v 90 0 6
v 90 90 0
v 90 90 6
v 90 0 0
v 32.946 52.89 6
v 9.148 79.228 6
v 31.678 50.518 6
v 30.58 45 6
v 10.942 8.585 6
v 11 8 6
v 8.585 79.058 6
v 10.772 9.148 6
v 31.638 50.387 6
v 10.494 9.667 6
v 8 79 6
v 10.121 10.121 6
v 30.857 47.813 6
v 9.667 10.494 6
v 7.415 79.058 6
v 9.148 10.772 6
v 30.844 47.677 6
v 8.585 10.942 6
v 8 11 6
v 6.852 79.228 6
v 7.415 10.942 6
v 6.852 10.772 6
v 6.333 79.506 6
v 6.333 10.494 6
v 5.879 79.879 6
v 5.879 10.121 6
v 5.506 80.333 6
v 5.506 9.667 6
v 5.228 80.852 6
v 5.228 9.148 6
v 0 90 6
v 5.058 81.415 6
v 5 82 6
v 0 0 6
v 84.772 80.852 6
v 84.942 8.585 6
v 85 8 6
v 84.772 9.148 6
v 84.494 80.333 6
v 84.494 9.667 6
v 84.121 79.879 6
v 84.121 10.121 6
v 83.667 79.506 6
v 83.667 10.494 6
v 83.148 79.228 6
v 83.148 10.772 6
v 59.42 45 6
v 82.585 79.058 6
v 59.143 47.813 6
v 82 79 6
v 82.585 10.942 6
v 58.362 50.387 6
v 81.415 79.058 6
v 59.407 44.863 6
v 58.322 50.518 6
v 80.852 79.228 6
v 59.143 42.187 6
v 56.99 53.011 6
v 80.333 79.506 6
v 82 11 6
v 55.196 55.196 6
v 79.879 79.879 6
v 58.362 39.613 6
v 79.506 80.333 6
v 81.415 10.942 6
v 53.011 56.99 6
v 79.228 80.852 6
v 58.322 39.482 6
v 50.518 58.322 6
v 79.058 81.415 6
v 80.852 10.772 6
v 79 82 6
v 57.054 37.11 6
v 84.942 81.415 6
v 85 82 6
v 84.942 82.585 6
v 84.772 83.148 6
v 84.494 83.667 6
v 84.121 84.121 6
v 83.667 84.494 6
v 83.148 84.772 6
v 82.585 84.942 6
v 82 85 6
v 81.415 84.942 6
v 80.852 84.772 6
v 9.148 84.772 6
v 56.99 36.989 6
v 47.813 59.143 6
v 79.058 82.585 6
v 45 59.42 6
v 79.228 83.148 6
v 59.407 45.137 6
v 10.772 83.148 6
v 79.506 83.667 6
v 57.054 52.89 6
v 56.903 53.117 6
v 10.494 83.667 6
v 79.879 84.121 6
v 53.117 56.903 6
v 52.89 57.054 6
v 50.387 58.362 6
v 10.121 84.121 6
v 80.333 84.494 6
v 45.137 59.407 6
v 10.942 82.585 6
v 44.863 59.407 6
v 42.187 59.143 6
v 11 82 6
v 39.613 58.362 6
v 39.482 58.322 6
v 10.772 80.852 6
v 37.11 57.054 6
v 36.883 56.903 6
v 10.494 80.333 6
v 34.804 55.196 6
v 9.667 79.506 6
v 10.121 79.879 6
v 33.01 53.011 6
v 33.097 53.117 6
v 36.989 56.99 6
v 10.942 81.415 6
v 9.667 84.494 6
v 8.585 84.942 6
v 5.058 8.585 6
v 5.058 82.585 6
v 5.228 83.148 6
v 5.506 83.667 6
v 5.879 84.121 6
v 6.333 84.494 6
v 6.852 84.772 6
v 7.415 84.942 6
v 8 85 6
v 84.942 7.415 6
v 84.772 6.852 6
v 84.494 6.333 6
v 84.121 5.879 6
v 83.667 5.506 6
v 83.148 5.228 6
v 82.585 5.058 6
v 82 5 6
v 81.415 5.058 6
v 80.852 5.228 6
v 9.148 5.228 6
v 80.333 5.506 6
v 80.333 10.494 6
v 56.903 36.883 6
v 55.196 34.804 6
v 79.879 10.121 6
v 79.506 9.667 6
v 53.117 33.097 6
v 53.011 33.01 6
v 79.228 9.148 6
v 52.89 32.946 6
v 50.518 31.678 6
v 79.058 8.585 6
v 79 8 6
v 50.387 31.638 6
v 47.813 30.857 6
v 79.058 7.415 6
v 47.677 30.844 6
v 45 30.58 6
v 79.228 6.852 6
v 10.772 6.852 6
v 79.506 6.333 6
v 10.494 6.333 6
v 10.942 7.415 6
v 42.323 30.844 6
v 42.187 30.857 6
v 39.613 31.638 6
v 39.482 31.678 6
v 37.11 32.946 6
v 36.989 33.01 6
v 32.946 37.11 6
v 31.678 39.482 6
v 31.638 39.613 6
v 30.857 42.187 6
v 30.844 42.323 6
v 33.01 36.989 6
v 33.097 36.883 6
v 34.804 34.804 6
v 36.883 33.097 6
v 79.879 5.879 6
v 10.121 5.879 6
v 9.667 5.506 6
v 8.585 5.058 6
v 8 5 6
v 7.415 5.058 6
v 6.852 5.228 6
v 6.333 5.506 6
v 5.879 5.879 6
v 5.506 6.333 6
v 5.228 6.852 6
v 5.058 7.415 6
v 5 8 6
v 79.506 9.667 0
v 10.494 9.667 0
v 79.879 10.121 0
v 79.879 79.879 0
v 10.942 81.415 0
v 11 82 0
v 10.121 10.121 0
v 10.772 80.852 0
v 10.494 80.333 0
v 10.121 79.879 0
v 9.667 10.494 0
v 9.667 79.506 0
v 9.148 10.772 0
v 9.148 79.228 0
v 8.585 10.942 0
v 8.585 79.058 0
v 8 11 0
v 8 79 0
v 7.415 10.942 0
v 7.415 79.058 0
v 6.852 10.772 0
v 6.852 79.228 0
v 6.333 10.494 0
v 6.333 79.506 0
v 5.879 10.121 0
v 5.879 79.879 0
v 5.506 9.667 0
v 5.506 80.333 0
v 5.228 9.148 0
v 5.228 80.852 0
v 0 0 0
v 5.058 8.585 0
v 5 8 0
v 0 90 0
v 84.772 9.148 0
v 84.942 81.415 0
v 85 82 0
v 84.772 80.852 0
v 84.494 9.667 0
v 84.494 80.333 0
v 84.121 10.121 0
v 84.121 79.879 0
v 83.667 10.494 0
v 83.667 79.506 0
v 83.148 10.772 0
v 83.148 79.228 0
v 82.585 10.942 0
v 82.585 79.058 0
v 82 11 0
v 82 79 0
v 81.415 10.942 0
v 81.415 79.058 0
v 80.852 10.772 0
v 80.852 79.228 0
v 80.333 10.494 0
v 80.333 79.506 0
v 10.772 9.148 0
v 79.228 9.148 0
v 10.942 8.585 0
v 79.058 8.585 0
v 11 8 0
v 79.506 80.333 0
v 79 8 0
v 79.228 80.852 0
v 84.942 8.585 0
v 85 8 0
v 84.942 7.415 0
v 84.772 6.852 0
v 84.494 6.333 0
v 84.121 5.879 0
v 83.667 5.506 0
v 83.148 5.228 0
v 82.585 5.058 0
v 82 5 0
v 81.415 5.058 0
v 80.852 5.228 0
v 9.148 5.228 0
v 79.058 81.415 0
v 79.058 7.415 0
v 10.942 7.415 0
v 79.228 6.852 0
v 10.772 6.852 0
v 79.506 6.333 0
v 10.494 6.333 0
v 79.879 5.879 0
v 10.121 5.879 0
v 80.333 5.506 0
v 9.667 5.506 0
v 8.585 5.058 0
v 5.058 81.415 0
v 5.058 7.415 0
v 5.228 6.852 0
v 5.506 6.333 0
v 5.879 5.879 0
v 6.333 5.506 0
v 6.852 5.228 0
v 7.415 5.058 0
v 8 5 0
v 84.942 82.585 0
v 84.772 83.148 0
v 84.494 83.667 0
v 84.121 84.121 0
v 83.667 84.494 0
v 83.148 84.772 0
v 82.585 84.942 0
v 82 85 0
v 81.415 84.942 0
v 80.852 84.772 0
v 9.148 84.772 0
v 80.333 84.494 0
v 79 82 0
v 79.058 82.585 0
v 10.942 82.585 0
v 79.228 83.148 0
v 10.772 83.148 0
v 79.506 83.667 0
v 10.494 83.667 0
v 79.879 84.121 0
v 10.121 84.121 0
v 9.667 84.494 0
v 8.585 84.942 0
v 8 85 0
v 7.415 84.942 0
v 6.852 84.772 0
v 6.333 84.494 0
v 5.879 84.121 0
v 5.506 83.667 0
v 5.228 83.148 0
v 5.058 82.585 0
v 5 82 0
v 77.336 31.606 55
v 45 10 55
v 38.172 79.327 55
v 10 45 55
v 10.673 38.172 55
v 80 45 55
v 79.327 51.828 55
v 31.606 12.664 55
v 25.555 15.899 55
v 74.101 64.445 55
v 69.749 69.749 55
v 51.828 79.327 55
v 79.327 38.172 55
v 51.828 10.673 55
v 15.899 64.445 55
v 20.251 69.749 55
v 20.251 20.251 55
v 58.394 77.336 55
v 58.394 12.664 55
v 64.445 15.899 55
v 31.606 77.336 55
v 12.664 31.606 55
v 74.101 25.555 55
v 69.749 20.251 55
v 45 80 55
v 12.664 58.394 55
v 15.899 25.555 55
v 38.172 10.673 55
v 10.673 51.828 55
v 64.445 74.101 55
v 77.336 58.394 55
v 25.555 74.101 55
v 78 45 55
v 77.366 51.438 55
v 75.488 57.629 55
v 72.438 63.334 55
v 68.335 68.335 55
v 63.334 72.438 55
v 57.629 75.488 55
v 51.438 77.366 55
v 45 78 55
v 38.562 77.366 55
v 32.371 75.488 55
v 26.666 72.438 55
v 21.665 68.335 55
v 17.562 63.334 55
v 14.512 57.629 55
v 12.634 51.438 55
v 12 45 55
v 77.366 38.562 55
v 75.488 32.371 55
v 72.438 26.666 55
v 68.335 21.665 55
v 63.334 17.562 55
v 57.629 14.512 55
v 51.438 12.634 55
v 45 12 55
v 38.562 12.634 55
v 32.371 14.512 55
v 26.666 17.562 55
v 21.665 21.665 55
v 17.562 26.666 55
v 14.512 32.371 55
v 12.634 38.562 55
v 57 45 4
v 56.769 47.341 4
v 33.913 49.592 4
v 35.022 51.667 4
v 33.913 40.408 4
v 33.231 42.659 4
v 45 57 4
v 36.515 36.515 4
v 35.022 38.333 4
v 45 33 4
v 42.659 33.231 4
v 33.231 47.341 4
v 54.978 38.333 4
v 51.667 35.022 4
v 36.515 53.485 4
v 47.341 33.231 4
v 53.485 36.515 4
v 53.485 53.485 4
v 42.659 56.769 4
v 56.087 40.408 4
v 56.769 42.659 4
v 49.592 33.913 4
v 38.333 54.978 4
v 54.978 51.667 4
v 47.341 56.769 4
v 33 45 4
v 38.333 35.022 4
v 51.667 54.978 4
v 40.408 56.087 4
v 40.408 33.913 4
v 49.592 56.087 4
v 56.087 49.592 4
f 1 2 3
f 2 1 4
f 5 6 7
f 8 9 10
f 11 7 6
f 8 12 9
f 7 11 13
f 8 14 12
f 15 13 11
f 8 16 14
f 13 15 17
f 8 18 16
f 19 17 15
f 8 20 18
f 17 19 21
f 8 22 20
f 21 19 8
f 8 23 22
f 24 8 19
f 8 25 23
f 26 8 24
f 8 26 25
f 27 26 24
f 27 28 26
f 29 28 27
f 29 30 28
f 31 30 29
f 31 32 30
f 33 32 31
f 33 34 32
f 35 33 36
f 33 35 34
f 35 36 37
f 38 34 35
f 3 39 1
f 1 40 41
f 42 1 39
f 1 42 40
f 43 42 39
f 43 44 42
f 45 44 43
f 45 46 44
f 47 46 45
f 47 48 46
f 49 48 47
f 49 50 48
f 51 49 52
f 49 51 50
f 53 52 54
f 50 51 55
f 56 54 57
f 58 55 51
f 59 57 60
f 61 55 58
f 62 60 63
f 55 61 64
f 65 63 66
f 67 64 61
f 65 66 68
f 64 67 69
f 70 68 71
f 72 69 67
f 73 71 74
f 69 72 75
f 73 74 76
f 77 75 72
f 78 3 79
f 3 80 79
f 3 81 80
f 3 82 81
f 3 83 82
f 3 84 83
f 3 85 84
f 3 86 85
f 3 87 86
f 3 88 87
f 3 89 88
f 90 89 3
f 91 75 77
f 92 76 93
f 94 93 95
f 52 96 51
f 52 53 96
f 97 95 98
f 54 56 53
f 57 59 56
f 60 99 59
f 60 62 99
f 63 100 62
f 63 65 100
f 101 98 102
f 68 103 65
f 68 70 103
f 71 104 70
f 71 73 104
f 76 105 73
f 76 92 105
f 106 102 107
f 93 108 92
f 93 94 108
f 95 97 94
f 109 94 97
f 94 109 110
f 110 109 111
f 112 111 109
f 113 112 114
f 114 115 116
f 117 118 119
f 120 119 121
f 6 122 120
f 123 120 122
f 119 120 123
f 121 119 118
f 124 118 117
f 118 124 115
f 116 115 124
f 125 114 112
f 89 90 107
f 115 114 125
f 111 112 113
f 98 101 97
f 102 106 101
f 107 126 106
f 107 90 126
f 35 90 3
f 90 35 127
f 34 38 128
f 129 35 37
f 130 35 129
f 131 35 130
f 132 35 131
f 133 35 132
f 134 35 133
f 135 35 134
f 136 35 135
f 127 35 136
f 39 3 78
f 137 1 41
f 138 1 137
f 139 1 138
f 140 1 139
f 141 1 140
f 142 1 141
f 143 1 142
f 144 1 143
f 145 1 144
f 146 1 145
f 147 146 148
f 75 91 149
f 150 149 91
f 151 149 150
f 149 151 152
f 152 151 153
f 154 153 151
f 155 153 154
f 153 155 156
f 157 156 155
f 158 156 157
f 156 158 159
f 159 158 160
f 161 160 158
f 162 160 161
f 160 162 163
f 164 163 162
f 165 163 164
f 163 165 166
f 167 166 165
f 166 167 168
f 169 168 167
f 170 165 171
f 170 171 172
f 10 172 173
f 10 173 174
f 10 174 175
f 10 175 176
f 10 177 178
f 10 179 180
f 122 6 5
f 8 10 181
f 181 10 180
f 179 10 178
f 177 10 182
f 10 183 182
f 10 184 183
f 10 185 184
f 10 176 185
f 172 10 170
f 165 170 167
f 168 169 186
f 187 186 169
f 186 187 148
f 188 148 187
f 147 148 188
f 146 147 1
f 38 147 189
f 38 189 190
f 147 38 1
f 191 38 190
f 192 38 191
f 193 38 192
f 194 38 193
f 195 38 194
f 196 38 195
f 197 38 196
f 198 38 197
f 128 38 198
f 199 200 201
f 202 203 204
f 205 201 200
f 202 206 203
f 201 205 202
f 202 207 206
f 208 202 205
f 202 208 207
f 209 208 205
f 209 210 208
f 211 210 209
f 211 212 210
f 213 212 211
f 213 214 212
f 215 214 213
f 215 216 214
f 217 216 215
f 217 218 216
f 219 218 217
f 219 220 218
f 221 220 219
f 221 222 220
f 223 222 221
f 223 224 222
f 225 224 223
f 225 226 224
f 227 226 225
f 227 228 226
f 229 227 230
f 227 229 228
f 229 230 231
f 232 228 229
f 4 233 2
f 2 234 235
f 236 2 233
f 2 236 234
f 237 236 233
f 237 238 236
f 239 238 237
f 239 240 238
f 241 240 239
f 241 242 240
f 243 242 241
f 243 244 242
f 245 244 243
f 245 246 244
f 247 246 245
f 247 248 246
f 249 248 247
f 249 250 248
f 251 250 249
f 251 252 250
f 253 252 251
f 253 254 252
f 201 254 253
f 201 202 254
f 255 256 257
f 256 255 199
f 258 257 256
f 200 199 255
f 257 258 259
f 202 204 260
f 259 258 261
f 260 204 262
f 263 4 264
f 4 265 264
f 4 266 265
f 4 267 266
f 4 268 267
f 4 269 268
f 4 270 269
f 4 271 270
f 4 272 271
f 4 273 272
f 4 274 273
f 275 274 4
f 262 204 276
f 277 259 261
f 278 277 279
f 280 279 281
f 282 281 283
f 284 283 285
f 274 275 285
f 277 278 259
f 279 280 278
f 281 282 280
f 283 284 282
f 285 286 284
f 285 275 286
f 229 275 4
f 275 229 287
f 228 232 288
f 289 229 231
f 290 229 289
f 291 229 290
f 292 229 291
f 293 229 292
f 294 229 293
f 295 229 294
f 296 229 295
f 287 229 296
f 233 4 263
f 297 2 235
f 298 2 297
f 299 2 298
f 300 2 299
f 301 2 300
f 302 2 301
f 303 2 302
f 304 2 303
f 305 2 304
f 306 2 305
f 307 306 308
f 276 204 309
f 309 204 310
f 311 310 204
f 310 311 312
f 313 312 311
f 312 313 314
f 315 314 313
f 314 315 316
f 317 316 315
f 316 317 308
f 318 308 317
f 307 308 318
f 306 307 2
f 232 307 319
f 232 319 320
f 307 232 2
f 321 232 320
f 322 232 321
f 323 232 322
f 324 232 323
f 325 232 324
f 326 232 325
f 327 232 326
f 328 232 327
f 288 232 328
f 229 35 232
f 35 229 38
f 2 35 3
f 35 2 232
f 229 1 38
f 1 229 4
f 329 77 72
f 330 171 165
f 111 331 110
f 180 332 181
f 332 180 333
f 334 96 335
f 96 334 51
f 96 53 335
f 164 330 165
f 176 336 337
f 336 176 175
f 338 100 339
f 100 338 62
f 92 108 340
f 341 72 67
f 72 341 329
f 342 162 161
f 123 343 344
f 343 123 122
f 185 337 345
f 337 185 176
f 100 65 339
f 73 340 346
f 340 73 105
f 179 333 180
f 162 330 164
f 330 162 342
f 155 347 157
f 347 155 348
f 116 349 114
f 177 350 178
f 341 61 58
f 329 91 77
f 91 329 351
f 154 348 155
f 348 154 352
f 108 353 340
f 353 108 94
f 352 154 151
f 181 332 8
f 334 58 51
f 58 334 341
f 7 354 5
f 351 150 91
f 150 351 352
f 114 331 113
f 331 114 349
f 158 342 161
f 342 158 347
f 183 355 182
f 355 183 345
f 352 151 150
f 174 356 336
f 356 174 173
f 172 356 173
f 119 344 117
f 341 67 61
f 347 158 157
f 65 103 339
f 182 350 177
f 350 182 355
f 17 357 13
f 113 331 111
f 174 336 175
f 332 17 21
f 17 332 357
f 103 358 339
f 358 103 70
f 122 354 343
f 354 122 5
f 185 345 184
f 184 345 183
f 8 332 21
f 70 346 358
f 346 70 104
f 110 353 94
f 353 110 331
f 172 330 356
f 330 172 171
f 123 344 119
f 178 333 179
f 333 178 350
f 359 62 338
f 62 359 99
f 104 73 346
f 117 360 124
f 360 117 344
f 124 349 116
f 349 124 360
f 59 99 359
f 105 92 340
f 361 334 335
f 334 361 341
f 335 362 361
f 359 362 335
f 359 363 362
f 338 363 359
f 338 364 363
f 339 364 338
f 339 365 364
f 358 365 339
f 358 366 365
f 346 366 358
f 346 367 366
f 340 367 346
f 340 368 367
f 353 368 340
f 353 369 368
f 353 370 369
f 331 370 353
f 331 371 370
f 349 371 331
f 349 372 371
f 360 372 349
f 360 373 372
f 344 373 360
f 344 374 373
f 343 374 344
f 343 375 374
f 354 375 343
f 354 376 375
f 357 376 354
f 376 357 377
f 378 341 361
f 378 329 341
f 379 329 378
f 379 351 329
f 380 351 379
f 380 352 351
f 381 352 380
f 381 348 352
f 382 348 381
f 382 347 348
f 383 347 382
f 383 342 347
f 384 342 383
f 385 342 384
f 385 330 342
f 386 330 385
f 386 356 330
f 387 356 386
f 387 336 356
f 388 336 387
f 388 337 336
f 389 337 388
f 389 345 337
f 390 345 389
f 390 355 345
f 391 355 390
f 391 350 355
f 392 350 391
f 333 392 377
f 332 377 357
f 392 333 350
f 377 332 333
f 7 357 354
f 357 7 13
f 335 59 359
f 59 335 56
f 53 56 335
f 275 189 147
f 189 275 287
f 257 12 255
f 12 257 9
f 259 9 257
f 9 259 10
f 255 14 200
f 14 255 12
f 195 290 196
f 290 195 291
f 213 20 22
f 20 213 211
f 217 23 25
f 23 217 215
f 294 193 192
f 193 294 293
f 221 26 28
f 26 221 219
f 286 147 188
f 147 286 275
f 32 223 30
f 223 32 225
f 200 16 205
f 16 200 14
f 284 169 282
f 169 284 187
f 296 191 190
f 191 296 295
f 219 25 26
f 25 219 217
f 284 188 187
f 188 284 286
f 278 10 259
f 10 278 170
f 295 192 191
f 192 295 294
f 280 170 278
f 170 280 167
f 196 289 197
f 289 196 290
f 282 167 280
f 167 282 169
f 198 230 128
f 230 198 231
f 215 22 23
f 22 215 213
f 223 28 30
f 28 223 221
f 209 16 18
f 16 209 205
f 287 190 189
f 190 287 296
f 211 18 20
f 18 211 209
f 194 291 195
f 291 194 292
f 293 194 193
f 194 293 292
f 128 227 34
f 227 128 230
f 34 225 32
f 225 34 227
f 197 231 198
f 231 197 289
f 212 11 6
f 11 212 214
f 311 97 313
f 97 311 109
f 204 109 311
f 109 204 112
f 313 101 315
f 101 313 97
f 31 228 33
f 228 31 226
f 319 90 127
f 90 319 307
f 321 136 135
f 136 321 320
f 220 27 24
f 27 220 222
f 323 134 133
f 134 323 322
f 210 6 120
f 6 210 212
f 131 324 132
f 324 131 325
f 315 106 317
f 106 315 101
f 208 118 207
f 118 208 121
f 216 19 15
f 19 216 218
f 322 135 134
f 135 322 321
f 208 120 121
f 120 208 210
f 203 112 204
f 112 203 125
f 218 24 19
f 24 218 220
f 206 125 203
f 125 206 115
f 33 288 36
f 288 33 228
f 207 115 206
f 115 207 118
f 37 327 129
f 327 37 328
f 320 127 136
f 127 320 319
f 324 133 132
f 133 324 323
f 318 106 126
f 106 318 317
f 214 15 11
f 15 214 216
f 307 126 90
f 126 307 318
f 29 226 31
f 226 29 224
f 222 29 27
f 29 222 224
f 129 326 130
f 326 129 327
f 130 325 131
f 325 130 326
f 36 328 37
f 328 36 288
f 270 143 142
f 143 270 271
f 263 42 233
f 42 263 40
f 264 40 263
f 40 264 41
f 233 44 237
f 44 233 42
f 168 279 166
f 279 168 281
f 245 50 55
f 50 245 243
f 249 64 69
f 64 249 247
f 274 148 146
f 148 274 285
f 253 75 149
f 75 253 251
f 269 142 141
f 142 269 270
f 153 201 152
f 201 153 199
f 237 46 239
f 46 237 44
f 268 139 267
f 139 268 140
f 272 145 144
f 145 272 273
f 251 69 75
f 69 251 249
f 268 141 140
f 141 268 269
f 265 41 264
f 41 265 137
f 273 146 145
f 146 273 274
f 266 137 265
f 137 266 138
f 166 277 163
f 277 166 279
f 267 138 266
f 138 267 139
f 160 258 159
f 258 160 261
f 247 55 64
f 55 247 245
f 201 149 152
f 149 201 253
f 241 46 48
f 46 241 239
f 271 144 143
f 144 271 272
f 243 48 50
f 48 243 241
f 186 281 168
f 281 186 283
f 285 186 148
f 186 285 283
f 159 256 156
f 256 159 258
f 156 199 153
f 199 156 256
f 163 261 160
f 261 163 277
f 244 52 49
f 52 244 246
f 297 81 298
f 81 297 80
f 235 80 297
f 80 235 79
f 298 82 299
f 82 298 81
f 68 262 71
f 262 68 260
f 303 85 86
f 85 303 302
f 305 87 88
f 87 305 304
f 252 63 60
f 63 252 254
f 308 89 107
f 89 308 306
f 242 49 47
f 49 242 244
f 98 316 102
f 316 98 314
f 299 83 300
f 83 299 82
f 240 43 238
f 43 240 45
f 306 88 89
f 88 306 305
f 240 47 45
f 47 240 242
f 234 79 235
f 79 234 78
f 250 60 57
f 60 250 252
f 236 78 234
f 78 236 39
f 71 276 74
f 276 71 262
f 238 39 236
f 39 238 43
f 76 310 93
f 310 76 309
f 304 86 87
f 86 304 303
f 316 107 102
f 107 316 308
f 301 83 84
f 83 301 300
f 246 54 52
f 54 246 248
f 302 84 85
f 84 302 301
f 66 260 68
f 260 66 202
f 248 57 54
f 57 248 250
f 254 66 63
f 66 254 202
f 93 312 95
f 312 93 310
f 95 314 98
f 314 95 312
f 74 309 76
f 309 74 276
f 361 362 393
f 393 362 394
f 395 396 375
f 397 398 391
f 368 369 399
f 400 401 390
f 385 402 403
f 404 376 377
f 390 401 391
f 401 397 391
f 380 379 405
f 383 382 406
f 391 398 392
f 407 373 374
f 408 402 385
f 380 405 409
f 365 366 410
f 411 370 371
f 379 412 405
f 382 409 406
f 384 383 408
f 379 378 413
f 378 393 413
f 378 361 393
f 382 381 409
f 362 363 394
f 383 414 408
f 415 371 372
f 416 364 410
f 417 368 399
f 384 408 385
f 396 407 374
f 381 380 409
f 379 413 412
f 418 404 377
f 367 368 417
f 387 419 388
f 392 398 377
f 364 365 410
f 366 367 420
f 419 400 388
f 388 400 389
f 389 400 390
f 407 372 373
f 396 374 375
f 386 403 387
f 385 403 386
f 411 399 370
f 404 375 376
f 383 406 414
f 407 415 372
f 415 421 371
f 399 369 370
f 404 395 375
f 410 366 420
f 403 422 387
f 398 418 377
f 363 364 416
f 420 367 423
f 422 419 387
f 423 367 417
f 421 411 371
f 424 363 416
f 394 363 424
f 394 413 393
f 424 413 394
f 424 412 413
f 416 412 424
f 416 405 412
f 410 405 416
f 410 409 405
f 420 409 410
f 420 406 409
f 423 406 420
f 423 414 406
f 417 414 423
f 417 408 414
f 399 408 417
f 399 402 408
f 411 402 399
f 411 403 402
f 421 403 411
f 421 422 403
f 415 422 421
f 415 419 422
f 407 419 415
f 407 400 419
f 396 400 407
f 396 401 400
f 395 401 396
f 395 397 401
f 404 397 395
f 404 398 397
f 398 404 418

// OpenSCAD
$fn = 32;

// ----------------------------------------------------------------------
// Hopper: flanged with square flange
// ----------------------------------------------------------------------

// --- parameters (mm) ---
fl = 90;                  // flange side, X and Y
fl_t = 6;                 // flange thickness
cone_h = 50;              // cone height above the flange
top_d = 70;               // cone mouth diameter
bot_d = 28;               // cone spout diameter
wall = 2;                 // cone wall thickness
hole_r = 3;               // flange hole radius
hole_in = 8;              // hole inset from the corners

bore_d = bot_d - 2 * wall;  // spout bore diameter
total_h = fl_t + cone_h - 1;  // overall height

difference() {
  union() {
    cube([fl, fl, fl_t]);
    translate([fl / 2, fl / 2, fl_t - 1])
      cylinder(h = cone_h, d1 = bot_d, d2 = top_d);
  }
  translate([fl / 2, fl / 2, fl_t - 2])
    cylinder(h = cone_h + 1, d1 = bore_d, d2 = top_d - 2 * wall);
  for (sx = [0, 1], sy = [0, 1])
    translate([sx ? fl - hole_in : hole_in,
               sy ? fl - hole_in : hole_in, -1])
      cylinder(r = hole_r, h = fl_t + 2);
}
